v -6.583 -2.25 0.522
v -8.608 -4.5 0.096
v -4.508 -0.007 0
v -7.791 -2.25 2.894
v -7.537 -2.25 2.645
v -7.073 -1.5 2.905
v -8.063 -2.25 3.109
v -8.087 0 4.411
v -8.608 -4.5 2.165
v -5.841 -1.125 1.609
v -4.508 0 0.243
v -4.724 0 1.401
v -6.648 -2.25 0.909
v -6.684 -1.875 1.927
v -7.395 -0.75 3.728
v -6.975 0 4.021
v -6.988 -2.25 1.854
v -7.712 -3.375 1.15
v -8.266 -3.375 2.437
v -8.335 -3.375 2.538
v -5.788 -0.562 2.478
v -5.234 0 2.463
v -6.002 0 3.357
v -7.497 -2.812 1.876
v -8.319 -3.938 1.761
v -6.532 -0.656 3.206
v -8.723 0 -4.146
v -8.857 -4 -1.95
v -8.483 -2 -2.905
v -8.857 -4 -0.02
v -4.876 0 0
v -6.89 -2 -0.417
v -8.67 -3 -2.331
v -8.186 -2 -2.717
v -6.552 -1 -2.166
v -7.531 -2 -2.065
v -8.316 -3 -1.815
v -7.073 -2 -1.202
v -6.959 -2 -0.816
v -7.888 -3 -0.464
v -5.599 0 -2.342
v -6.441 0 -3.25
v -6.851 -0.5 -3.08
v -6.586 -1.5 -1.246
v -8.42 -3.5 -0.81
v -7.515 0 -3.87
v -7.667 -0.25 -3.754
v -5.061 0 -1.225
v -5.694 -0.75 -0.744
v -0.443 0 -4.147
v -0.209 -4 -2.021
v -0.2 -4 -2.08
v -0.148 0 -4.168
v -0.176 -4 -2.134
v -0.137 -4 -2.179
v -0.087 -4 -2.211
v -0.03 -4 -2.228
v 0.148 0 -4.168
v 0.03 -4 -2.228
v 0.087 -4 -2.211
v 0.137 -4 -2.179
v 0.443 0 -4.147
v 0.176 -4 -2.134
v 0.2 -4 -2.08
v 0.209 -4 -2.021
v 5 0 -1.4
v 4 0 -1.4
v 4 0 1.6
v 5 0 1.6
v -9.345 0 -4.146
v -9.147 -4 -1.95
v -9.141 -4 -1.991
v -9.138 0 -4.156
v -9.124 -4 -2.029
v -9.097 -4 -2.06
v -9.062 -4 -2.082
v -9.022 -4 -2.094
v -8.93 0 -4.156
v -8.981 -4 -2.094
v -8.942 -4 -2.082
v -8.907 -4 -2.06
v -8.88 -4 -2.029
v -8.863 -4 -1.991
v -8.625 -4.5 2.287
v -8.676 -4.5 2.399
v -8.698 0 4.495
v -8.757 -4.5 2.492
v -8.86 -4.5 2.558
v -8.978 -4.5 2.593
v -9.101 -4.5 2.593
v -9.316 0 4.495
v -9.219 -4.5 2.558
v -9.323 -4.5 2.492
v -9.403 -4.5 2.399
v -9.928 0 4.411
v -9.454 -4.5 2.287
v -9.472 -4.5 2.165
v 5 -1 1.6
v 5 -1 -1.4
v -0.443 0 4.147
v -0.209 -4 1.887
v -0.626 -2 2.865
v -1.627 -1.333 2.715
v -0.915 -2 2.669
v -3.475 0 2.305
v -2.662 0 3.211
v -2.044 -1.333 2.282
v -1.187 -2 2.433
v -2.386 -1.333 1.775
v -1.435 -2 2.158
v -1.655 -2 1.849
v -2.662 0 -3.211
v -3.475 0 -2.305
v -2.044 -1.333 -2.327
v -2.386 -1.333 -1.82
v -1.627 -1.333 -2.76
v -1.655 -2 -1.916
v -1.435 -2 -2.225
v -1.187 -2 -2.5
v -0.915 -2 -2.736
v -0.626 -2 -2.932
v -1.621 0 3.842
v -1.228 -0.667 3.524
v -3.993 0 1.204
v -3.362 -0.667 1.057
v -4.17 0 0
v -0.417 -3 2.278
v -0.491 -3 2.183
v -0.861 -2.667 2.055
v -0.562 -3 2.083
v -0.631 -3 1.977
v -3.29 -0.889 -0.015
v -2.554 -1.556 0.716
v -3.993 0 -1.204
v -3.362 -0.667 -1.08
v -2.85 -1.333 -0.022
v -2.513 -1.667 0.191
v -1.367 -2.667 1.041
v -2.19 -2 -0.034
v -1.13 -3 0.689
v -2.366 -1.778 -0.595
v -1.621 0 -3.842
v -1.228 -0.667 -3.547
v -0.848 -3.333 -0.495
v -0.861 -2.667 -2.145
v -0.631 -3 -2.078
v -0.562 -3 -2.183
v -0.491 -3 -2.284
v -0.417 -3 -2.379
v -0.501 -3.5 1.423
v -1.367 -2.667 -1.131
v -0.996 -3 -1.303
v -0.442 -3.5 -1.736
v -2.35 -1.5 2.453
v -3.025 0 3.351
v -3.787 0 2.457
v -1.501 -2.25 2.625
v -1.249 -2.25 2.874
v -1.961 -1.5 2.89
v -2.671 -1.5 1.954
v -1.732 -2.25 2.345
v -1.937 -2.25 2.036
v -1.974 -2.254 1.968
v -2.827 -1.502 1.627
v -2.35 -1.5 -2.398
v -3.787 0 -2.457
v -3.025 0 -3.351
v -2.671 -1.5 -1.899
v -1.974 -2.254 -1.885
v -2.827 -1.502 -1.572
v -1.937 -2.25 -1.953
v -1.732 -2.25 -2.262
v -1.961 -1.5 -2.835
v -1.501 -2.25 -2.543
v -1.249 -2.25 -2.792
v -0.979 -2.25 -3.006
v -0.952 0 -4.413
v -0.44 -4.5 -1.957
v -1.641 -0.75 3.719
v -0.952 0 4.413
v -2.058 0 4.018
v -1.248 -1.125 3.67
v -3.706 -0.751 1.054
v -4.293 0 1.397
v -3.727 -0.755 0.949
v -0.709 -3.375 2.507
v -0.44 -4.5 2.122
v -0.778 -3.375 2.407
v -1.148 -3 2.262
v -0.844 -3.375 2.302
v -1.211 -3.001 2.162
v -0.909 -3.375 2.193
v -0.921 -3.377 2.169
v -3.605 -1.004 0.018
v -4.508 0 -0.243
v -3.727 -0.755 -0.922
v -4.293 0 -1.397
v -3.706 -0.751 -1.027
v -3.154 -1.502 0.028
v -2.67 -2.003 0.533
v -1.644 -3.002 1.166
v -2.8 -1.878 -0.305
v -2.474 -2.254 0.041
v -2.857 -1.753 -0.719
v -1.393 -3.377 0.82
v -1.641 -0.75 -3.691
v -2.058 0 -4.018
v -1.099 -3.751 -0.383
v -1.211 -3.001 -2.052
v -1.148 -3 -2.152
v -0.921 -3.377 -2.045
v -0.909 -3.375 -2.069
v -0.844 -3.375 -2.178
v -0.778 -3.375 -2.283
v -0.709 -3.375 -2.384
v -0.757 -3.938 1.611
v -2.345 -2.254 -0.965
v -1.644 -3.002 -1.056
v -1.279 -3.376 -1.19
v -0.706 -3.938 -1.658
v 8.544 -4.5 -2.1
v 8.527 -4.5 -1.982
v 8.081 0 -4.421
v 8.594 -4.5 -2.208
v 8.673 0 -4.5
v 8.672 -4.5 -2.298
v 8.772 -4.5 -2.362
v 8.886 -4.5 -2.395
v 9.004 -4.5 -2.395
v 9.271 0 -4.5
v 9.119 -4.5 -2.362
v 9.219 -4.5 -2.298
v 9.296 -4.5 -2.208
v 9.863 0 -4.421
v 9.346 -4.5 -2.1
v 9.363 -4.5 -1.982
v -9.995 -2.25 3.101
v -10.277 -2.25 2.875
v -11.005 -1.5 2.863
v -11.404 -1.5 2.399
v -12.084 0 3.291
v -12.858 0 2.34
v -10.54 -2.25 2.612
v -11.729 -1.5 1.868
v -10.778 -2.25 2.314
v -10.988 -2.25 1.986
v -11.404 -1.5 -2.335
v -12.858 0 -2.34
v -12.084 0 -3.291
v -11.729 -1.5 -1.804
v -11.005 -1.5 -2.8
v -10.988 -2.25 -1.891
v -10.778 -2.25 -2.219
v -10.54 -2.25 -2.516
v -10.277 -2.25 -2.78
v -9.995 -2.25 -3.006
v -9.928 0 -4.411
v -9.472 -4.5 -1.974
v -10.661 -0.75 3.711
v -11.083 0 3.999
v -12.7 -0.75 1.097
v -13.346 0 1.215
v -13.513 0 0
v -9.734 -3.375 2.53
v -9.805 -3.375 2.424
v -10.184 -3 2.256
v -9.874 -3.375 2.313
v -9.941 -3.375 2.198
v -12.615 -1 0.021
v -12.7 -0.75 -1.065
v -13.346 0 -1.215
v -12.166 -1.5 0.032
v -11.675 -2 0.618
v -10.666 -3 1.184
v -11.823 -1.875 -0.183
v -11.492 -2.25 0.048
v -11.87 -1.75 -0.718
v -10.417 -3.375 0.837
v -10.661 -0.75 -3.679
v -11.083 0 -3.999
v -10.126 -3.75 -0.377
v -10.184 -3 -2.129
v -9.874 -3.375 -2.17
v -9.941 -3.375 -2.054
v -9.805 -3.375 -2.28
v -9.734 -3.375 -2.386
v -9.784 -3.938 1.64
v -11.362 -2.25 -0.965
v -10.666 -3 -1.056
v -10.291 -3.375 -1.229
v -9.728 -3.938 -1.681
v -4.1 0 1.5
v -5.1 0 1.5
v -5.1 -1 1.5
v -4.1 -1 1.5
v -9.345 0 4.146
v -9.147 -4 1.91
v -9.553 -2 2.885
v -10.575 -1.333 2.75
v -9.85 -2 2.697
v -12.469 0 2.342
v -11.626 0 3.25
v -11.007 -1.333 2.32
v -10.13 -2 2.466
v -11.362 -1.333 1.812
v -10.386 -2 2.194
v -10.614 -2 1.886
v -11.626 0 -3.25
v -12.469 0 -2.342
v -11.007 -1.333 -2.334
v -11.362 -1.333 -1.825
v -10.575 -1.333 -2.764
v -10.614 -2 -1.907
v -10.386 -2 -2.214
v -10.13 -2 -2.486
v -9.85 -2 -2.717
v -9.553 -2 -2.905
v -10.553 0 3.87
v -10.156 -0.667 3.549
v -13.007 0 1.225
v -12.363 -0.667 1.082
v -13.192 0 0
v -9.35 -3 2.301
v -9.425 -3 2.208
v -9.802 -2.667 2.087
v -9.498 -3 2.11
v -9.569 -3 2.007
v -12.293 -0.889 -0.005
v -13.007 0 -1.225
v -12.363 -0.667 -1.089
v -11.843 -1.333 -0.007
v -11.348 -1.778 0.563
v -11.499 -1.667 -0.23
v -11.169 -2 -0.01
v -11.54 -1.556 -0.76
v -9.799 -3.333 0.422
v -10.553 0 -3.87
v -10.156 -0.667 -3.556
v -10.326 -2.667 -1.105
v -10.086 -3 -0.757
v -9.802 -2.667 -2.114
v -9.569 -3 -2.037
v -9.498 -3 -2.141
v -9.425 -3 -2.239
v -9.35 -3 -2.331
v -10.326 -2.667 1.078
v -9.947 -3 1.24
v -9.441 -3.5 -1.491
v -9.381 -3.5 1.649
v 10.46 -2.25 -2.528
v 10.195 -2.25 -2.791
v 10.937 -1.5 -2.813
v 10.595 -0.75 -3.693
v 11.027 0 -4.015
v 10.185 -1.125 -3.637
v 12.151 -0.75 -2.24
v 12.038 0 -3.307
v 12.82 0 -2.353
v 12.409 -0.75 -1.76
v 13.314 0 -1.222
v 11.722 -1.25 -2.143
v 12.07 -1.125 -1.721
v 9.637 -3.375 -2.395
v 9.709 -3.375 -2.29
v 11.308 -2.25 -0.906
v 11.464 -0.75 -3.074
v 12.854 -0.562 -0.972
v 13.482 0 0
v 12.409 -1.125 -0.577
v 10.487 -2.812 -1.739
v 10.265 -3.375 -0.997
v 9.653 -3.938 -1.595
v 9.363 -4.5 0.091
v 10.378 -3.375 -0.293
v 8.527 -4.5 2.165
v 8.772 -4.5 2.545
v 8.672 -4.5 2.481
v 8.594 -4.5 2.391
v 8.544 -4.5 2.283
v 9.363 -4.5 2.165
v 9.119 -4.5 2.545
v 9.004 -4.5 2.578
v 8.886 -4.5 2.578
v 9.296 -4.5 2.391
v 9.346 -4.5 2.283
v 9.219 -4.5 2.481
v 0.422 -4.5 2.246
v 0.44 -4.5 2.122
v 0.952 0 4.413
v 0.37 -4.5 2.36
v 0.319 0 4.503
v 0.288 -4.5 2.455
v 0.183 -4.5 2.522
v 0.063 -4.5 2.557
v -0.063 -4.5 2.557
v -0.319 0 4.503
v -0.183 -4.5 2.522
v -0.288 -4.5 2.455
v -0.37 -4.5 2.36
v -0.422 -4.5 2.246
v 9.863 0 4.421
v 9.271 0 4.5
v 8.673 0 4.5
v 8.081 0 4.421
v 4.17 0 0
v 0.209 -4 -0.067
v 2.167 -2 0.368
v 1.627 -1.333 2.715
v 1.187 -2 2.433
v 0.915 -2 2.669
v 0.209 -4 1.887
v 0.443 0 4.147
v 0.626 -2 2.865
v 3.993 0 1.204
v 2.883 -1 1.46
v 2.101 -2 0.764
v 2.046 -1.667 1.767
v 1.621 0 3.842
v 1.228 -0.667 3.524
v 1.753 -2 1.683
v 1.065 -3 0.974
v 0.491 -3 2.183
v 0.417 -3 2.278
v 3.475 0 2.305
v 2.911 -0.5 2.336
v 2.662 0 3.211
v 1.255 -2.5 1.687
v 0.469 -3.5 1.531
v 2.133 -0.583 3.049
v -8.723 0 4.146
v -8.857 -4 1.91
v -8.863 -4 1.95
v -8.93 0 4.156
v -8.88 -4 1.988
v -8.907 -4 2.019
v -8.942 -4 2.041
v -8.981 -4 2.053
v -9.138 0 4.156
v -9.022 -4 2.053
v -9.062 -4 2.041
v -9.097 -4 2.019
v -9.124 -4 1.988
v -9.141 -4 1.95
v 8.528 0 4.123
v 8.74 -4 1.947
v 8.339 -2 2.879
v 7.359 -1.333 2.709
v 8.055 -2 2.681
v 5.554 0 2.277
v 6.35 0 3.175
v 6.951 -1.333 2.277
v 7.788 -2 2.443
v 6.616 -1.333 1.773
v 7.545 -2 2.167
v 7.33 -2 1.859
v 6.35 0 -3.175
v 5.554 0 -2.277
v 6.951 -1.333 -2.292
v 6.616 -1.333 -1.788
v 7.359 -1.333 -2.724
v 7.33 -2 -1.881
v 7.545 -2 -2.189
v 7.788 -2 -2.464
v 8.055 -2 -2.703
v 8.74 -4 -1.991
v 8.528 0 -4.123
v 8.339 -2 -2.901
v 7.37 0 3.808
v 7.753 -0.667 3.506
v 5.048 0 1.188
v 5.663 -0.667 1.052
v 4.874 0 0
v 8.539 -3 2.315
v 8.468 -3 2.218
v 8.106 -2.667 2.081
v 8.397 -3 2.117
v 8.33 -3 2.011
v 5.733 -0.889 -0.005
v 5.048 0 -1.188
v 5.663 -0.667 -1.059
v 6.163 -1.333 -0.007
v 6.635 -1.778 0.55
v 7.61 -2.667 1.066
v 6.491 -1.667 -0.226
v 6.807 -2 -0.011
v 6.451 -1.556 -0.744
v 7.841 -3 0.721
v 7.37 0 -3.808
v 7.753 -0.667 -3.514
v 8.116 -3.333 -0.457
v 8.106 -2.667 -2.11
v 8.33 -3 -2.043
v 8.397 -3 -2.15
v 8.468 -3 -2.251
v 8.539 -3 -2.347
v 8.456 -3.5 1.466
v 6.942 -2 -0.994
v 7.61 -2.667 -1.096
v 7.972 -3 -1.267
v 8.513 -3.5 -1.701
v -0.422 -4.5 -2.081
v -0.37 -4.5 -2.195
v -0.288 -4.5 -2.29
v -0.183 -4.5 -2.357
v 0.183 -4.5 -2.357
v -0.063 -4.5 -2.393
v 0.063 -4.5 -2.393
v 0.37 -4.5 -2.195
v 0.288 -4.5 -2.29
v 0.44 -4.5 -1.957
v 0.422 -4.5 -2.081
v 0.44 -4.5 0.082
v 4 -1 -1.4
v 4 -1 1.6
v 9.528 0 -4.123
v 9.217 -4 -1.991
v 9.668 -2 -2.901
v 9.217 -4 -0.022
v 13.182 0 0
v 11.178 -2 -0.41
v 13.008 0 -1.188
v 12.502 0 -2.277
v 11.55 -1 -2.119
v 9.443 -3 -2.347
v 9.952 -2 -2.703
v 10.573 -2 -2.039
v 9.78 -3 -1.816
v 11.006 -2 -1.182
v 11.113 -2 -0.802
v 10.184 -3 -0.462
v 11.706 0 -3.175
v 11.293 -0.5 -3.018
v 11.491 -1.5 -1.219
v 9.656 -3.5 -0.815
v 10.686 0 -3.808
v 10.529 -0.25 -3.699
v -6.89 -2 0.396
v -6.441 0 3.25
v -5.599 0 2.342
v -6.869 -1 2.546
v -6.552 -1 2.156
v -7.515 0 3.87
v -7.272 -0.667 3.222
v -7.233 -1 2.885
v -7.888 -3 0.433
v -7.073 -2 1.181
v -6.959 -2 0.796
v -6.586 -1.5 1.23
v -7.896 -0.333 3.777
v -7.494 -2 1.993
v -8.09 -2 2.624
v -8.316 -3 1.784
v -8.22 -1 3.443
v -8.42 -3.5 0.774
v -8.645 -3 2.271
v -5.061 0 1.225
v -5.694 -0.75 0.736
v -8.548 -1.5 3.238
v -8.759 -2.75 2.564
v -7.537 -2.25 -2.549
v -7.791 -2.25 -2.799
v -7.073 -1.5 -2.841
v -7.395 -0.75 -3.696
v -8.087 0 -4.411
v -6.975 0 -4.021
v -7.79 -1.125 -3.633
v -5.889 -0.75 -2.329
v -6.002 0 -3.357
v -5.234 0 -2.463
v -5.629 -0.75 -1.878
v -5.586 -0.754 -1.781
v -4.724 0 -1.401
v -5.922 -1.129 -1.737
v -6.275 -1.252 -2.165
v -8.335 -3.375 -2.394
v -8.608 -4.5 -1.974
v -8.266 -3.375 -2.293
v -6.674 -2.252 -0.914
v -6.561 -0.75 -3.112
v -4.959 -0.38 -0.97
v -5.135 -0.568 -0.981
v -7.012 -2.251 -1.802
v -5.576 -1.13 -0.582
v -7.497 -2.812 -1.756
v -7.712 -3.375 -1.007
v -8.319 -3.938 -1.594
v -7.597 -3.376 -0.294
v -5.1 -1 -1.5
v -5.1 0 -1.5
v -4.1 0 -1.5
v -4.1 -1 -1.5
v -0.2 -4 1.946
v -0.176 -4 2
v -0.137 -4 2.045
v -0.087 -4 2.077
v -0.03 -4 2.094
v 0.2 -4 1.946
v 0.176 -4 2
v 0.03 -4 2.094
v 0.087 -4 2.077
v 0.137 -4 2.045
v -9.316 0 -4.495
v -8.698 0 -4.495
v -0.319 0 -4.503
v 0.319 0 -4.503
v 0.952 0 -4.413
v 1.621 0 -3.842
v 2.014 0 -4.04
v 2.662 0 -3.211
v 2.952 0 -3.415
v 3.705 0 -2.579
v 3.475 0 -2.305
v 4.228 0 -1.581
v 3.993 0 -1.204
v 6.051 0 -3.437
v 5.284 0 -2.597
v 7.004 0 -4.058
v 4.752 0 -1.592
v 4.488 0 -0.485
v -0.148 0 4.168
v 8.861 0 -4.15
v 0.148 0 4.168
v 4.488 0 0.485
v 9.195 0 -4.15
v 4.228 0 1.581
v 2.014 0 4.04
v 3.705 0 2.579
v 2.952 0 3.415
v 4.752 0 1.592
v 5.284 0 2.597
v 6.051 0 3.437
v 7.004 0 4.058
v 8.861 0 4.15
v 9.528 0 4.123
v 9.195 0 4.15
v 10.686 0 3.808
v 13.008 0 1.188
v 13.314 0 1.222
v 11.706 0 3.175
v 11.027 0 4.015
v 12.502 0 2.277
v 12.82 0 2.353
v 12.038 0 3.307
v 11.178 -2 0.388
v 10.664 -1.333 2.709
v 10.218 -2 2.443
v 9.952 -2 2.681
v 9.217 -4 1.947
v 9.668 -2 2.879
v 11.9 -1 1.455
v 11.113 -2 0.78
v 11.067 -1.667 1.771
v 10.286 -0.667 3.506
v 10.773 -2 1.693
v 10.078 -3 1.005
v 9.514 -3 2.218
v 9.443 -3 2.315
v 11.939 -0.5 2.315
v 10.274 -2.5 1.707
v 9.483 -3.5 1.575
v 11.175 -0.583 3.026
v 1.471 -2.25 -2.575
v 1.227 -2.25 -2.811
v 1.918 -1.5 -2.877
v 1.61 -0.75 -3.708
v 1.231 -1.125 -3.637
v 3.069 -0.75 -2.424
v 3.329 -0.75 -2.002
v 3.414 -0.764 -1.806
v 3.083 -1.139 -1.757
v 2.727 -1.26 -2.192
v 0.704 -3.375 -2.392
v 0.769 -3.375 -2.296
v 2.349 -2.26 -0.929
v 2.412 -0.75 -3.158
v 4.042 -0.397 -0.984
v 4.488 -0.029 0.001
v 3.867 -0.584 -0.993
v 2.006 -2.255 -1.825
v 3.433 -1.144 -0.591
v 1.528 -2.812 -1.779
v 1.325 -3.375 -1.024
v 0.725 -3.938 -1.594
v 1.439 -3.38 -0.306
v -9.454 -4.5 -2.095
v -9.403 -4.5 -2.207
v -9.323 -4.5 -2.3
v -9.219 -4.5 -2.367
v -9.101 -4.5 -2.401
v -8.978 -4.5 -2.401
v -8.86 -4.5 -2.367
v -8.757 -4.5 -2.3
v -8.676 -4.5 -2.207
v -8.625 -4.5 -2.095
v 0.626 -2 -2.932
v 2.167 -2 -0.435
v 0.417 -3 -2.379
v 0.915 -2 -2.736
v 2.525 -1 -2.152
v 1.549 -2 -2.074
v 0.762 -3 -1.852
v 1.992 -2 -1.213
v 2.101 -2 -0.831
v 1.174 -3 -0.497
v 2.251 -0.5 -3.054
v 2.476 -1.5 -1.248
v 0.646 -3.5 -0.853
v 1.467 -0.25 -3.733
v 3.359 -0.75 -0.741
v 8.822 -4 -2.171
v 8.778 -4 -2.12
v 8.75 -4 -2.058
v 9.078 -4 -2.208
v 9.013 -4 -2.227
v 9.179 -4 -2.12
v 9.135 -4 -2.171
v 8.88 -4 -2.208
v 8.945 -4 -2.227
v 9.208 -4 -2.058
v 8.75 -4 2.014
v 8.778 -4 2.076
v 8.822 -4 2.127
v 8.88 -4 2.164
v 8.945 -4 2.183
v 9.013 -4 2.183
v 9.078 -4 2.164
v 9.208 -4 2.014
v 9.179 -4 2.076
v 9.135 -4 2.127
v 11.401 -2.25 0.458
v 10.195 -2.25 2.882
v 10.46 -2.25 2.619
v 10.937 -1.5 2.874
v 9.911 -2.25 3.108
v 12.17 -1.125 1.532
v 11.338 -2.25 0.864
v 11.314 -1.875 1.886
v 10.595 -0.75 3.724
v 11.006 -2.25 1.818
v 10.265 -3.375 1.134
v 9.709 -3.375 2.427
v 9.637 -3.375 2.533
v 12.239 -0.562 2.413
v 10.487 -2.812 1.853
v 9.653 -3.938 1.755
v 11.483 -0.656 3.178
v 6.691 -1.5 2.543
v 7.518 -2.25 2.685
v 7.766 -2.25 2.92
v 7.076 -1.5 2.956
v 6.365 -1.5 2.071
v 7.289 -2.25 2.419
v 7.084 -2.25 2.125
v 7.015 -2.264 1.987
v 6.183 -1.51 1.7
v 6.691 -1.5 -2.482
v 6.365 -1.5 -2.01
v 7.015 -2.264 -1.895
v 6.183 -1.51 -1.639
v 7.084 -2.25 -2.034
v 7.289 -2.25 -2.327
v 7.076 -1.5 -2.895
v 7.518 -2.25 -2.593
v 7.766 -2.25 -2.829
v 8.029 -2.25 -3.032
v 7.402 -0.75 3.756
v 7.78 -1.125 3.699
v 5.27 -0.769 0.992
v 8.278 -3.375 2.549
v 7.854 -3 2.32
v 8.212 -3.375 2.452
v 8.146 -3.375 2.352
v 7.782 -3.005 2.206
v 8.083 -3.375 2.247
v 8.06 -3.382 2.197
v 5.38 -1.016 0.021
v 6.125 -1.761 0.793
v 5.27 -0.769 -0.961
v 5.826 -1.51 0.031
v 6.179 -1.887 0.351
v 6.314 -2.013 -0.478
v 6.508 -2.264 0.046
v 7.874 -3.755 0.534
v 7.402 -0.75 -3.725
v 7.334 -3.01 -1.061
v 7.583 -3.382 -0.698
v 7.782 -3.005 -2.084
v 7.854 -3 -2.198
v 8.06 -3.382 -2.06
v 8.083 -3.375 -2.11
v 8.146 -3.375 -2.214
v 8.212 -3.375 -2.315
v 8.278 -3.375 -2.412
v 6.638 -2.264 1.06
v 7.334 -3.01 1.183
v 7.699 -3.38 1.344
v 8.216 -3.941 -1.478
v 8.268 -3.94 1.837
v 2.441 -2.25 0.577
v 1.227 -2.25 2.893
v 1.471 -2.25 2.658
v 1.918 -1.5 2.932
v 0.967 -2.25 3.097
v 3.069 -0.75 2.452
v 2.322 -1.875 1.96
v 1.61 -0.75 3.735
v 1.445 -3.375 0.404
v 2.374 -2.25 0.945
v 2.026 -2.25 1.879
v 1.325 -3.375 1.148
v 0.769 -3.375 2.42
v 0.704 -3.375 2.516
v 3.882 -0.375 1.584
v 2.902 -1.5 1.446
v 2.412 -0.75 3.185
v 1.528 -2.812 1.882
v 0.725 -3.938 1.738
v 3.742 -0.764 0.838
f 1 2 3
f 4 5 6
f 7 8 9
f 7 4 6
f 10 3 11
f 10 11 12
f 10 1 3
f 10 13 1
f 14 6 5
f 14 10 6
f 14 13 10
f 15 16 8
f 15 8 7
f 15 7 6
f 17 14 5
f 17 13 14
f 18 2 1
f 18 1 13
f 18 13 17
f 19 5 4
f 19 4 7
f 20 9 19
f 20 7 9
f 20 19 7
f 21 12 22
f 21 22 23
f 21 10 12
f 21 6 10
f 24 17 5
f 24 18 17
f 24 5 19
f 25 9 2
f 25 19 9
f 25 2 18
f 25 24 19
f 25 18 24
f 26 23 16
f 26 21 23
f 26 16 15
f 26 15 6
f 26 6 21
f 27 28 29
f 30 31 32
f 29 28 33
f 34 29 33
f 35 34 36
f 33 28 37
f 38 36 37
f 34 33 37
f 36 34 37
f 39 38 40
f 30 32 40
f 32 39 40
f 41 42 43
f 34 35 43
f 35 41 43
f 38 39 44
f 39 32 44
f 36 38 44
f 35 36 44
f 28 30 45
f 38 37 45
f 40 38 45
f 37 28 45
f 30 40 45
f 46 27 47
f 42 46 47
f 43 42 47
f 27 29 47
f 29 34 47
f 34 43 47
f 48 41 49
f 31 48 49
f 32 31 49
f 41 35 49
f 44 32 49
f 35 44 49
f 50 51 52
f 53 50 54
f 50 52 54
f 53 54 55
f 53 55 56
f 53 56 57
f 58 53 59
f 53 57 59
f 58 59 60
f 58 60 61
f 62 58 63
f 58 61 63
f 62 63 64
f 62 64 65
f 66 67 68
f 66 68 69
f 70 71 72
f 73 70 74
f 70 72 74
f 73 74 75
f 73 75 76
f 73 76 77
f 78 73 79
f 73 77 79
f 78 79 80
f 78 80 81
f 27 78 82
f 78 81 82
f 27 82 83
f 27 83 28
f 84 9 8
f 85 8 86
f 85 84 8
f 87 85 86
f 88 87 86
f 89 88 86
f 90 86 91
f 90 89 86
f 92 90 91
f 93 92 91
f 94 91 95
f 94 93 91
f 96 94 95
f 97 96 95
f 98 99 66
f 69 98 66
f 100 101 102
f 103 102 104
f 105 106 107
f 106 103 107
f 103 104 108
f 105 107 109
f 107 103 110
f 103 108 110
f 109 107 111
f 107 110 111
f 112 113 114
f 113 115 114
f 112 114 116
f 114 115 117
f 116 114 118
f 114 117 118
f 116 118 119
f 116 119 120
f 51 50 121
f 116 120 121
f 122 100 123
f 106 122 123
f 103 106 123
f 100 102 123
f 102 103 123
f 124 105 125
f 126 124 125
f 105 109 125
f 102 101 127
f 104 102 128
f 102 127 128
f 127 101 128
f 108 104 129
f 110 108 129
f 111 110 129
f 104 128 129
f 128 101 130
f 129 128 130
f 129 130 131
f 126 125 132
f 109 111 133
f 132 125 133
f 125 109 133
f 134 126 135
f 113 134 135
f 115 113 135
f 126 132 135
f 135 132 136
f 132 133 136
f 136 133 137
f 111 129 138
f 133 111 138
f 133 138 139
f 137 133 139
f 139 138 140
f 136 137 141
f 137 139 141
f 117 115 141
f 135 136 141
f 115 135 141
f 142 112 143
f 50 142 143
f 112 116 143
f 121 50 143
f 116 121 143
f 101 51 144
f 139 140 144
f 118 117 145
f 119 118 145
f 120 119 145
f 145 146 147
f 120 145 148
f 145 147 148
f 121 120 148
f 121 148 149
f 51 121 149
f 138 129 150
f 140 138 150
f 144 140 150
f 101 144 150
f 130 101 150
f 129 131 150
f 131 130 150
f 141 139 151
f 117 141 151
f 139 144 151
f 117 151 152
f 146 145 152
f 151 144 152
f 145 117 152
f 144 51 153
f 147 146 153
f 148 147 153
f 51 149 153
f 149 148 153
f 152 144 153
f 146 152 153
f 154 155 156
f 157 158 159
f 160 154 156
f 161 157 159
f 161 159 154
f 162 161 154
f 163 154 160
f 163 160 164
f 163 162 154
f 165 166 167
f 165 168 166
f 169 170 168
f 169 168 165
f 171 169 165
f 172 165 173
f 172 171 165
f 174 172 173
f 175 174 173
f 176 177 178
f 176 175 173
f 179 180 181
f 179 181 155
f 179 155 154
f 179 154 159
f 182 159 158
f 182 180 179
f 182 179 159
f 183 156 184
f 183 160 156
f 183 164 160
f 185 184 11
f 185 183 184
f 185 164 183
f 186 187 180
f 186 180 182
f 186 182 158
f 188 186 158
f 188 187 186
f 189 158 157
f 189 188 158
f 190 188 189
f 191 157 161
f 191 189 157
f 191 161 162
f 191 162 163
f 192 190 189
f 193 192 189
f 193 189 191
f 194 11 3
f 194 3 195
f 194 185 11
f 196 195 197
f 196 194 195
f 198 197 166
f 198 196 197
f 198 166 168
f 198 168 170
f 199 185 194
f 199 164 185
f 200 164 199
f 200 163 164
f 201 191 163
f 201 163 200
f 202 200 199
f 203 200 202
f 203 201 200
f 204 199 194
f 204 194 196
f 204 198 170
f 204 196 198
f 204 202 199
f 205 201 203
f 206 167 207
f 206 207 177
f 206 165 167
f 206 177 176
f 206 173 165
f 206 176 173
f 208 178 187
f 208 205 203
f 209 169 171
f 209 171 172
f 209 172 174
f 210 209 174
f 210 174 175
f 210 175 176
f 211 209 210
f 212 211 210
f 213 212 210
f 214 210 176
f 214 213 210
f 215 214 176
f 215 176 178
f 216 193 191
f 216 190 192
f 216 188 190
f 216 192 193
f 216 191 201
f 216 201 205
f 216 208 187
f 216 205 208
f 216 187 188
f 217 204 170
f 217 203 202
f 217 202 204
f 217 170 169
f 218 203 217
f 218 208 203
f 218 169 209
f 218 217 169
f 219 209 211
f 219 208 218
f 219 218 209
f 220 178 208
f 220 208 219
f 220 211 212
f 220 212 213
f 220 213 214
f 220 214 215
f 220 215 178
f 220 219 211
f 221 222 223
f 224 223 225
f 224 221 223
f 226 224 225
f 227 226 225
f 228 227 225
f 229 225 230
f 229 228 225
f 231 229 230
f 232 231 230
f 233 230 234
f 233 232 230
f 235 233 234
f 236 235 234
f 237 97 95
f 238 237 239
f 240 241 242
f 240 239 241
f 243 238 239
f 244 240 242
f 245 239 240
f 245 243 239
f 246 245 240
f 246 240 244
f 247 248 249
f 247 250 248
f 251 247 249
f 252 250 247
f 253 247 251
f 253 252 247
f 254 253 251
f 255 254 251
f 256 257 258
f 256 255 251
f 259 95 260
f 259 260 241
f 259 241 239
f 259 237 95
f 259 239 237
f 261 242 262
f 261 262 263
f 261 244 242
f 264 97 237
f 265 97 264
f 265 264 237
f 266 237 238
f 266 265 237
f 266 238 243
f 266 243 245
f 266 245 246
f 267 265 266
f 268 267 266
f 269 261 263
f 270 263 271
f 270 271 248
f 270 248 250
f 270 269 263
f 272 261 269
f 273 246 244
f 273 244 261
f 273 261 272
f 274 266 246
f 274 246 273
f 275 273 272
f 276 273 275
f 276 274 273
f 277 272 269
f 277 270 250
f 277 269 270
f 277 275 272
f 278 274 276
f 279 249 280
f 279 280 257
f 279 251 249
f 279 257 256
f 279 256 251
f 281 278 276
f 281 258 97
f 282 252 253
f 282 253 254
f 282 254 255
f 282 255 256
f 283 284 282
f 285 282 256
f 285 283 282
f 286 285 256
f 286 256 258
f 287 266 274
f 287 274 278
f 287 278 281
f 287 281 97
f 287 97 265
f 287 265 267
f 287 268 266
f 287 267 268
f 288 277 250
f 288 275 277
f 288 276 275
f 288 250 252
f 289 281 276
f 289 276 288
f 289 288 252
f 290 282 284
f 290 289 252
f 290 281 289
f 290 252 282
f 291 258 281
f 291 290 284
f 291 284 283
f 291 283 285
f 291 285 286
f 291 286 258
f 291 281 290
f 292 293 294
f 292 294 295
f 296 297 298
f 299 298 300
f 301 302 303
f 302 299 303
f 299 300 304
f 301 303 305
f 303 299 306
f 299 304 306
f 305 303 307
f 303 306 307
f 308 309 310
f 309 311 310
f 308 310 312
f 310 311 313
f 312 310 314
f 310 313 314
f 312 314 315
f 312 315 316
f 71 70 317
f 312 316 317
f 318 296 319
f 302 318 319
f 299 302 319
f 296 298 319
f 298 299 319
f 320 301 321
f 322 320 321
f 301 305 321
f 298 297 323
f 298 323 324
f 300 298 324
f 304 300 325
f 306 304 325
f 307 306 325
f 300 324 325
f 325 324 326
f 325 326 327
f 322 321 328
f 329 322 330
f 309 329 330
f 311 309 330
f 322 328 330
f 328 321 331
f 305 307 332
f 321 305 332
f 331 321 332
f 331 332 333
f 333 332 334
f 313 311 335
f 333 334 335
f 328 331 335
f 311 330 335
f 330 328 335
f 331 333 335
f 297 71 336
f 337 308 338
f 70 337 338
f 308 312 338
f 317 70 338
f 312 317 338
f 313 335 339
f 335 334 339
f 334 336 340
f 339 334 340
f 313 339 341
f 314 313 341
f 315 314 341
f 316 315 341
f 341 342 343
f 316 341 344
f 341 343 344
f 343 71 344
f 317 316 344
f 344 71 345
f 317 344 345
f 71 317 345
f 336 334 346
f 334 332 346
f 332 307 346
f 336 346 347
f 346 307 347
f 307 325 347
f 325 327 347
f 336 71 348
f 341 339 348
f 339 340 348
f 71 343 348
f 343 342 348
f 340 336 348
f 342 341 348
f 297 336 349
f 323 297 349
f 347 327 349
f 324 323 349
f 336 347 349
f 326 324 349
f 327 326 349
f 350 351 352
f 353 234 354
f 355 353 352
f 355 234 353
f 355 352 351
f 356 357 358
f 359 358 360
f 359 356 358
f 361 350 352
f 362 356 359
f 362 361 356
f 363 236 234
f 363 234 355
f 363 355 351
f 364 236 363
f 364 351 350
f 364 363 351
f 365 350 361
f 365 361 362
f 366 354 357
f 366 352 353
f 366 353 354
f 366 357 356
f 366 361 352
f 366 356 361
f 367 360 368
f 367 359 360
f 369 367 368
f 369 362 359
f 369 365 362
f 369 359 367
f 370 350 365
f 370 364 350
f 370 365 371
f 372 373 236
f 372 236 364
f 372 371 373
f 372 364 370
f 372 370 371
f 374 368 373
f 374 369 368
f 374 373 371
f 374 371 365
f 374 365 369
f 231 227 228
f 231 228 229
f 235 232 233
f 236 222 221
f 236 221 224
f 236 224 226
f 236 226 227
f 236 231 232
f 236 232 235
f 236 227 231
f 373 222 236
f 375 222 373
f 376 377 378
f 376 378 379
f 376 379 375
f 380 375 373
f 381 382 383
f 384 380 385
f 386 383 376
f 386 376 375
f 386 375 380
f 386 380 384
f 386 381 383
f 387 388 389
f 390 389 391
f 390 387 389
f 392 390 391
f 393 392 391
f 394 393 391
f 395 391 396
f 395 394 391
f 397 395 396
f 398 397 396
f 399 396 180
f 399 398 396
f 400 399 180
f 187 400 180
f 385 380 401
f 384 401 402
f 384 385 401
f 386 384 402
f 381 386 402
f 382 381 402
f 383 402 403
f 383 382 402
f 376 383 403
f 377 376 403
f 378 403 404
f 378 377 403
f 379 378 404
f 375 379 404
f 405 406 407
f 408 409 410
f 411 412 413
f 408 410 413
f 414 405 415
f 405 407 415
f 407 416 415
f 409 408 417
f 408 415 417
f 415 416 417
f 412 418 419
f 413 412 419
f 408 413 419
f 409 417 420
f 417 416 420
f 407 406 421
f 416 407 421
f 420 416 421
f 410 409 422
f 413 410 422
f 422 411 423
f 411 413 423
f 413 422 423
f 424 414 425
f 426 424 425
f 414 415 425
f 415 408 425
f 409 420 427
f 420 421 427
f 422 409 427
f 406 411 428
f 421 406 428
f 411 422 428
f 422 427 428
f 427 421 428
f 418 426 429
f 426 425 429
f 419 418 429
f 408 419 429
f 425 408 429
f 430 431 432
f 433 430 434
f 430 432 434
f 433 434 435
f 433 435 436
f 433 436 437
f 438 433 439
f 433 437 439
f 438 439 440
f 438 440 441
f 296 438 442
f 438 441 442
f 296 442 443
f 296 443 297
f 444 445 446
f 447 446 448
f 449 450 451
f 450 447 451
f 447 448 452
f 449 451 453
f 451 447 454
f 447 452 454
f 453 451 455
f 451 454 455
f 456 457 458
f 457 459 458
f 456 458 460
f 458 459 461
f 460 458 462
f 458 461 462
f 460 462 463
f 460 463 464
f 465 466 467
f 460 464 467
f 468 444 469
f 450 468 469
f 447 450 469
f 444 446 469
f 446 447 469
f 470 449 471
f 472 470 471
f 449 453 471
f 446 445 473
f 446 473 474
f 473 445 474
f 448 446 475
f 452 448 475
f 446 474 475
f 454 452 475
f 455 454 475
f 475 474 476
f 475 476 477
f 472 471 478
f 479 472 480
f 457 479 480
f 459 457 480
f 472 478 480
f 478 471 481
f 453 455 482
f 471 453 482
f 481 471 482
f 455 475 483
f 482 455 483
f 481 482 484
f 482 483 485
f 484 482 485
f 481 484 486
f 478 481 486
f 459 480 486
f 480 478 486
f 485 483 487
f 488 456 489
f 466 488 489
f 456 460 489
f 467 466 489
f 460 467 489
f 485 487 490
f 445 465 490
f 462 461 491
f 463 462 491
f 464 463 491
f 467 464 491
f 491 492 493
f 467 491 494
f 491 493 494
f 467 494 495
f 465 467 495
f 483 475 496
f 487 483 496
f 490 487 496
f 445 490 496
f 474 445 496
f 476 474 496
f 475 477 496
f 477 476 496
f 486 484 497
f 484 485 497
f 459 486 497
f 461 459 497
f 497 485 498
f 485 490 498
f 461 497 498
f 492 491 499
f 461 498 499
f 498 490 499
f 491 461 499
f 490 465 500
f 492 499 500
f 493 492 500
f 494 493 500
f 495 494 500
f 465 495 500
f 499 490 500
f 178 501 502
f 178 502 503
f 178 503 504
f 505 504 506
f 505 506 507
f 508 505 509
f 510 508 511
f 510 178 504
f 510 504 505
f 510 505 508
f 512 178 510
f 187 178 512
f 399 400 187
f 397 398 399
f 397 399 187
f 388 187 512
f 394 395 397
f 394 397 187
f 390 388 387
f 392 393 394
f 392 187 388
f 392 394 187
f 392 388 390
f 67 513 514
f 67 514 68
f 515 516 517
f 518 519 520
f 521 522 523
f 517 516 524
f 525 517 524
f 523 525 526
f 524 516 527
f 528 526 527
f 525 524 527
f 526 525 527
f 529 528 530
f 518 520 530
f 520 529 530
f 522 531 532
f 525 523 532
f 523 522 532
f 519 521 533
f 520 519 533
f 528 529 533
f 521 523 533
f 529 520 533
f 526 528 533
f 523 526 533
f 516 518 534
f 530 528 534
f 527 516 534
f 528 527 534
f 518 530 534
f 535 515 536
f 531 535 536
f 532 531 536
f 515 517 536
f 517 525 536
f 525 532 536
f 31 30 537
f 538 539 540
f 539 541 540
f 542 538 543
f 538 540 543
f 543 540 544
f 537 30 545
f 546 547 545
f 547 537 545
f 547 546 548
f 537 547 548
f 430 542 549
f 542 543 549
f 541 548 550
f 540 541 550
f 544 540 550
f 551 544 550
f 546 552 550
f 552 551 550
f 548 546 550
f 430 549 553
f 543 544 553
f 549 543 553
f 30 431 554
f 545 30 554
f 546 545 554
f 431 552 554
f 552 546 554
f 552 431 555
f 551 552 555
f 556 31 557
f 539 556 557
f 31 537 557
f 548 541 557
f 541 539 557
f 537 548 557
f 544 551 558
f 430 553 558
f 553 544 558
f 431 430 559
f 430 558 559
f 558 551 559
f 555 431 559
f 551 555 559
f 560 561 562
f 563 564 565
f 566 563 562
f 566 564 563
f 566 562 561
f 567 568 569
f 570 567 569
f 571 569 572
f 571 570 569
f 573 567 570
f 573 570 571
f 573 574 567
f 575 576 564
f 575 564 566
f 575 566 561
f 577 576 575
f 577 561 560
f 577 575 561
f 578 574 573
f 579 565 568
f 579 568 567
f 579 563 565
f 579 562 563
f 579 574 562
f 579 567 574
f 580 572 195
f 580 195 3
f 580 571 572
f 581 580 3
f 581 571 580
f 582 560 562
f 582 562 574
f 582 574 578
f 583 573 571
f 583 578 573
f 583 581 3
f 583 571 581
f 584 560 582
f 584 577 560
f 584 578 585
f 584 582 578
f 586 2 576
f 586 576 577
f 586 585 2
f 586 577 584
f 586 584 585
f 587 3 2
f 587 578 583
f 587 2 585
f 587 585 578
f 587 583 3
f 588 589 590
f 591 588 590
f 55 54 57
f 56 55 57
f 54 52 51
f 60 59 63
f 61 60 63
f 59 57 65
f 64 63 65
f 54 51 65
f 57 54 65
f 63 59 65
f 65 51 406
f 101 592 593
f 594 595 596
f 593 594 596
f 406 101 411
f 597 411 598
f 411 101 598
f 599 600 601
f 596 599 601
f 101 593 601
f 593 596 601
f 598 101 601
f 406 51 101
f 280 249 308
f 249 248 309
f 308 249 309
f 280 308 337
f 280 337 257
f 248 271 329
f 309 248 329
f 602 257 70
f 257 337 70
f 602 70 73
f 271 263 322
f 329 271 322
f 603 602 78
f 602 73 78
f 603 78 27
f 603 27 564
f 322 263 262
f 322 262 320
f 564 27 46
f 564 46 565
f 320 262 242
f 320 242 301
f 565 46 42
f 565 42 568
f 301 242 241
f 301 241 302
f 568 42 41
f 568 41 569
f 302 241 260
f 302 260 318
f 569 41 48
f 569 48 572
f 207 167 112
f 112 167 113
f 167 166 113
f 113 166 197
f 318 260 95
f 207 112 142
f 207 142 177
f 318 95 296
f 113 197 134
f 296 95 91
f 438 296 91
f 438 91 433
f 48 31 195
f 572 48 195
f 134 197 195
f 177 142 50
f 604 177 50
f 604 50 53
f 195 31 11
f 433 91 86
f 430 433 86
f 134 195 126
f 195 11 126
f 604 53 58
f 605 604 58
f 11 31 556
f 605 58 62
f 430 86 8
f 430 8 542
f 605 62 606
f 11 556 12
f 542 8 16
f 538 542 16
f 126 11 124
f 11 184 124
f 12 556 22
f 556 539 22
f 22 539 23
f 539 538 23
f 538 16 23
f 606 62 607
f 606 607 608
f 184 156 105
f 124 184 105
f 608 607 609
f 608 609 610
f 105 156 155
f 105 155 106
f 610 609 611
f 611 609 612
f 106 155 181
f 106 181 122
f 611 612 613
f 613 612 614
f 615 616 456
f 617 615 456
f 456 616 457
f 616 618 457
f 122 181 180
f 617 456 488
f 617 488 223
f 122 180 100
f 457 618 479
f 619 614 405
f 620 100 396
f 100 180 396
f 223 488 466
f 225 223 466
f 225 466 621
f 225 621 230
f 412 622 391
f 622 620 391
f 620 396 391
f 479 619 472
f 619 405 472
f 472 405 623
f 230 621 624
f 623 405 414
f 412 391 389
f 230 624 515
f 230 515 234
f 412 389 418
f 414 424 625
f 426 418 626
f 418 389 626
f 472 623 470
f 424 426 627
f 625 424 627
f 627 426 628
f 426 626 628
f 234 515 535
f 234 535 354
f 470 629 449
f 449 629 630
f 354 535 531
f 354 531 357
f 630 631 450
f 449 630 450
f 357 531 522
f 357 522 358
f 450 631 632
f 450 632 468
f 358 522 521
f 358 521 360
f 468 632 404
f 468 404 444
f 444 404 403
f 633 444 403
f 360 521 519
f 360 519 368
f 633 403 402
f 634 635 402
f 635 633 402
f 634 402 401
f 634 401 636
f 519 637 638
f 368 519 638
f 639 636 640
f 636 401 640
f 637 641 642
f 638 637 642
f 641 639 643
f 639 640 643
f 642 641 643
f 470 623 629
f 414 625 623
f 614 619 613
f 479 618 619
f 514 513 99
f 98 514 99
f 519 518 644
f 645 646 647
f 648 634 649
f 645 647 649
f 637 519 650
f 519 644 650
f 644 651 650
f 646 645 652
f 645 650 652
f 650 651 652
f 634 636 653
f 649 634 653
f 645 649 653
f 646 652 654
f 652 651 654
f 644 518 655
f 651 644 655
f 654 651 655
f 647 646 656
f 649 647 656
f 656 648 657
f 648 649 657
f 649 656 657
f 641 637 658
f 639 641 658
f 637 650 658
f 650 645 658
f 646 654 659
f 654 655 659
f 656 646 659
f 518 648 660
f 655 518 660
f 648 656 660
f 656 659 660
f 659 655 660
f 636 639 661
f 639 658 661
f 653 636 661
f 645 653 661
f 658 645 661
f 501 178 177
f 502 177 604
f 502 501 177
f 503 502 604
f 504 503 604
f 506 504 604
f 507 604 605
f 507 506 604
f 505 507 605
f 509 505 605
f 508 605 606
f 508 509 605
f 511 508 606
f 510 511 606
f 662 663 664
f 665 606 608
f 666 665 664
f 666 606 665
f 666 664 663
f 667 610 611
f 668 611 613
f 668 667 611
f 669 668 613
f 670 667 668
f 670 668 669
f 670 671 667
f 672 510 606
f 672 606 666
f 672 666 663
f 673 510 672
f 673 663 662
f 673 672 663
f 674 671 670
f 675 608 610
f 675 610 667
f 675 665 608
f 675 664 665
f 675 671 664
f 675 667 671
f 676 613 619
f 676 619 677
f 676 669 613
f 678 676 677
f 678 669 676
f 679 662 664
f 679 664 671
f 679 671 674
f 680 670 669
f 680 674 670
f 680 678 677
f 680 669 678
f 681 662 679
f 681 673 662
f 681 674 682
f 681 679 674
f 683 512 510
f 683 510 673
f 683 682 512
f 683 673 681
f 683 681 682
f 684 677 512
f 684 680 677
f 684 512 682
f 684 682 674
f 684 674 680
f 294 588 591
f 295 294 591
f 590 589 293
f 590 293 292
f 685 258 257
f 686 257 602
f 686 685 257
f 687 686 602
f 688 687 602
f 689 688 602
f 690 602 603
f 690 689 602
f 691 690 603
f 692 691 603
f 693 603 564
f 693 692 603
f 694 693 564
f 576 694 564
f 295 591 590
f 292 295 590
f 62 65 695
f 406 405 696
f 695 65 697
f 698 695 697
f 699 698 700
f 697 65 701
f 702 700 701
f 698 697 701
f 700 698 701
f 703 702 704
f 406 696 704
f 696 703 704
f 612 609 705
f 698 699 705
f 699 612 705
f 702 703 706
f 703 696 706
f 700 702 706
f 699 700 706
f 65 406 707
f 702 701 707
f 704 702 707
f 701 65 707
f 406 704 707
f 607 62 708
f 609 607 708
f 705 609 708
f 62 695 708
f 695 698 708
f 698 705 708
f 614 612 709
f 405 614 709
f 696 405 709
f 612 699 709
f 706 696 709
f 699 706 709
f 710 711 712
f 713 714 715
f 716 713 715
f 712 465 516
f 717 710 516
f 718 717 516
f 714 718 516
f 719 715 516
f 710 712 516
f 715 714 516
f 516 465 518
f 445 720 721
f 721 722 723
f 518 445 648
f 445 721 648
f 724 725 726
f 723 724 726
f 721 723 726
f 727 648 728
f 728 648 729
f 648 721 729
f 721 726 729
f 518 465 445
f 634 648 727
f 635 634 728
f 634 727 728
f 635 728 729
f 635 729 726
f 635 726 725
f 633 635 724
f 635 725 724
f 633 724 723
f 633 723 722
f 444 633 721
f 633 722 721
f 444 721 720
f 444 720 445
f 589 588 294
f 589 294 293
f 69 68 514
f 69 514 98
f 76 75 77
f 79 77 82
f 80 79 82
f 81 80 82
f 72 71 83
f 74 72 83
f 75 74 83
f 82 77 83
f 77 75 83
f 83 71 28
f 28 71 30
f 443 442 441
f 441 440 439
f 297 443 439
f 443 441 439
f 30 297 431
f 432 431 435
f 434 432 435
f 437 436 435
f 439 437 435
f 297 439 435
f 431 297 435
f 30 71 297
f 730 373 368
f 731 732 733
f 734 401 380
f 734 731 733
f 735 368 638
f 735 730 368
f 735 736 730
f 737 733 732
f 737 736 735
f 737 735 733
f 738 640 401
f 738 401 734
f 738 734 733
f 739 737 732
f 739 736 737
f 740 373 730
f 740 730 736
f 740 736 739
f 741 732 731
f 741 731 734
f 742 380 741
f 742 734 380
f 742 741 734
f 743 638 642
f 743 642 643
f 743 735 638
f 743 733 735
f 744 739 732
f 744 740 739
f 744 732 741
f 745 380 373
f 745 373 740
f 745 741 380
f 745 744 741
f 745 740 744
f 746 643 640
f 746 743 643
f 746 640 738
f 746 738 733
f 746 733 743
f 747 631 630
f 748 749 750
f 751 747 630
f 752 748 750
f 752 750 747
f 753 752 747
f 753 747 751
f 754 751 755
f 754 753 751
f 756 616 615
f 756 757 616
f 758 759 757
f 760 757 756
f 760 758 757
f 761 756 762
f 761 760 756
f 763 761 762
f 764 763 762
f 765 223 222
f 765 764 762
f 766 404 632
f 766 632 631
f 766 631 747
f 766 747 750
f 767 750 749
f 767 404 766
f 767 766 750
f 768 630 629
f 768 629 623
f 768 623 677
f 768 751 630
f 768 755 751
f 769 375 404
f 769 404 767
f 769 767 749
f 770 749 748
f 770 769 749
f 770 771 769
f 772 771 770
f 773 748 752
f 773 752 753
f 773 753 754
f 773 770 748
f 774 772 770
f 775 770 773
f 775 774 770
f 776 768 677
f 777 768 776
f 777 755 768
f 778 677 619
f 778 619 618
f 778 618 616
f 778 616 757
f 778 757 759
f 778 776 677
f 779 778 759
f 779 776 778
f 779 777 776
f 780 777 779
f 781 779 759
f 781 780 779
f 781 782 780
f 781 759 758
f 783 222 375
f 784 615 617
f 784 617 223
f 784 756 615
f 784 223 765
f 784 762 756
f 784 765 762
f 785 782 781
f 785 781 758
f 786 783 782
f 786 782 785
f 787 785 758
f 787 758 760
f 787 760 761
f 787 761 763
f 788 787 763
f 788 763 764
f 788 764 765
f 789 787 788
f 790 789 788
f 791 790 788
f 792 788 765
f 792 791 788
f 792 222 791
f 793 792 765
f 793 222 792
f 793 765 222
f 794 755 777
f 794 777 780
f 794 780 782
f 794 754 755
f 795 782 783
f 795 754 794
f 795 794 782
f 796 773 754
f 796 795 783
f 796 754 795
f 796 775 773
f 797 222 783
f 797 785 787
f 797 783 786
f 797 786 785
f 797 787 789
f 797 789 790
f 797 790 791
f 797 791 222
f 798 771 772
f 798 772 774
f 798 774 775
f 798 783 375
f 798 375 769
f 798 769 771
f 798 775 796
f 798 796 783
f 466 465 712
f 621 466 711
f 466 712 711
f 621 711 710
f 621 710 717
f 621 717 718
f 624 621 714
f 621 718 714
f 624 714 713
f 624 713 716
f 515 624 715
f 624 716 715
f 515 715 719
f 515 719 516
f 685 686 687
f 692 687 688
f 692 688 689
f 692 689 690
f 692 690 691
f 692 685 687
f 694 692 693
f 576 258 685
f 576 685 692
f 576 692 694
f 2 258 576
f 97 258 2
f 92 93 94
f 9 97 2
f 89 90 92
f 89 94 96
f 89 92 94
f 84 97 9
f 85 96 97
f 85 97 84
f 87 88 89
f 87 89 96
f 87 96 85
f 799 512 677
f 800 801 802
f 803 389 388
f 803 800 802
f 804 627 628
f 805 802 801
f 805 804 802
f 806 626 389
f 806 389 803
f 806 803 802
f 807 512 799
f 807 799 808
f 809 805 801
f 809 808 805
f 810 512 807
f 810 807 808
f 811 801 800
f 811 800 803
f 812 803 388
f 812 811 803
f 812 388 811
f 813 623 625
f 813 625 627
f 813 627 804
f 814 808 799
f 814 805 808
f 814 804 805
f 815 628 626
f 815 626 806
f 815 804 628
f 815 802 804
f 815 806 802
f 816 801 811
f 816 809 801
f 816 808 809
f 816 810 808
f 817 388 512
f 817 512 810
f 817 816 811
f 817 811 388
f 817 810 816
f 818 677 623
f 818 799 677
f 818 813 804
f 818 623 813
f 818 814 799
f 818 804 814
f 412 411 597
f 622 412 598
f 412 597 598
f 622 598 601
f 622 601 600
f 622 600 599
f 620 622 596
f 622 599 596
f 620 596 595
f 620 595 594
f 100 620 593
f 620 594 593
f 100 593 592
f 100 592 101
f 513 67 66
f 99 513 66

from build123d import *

# Parameters (mm, degrees)
SKETCH001_R  = 4.505883
SKETCH002_R  = 4.157663
SKETCH005_R  = 4.514229
SKETCH007_R  = 4.170362
SKETCH009_R  = 4.510212
SKETCH011_R  = 4.153649
BOX_W        = 1
BOX_H        = 1
BOX_DEPTH    = 3
BOX001_W     = 1
BOX001_H     = 1
BOX001_DEPTH = 3


with BuildPart() as body:
    # Sketch001 → AdditiveLoft section 0
    with BuildSketch(Plane.XZ):
        with Locations((-9.007039, 0)):
            Circle(SKETCH001_R)
    # Sketch003 (on DatumPlane) → AdditiveLoft section 1
    with BuildSketch(Plane.XZ.offset(4.5)):
        with BuildLine():
            ThreePointArc((-9.471652, -1.97382), (-9.039764, -2.405708), (-8.607876, -1.97382))
            Line((-8.607876, -1.97382), (-8.607876, 2.165107))
            ThreePointArc((-8.607876, 2.165107), (-9.039764, 2.596995), (-9.471652, 2.165107))
            Line((-9.471652, -1.97382), (-9.471652, 2.165107))
        make_face()
    loft()

    # Sketch002 → SubtractiveLoft section 0
    with BuildSketch(Plane.XZ):
        with Locations((-9.03385, 0)):
            Circle(SKETCH002_R)
    # Sketch004 (on DatumPlane) → SubtractiveLoft section 1
    with BuildSketch(Plane.XZ.offset(4)):
        with BuildLine():
            ThreePointArc((-9.146642, -1.950446), (-9.00189, -2.095198), (-8.857138, -1.950446))
            Line((-8.857138, -1.950446), (-8.857138, 1.909597))
            ThreePointArc((-8.857138, 1.909597), (-9.00189, 2.054349), (-9.146642, 1.909597))
            Line((-9.146642, -1.950446), (-9.146642, 1.909597))
        make_face()
    loft(mode=Mode.SUBTRACT)

    # Sketch005 → AdditiveLoft001 section 0
    with BuildSketch(Plane.XZ):
        Circle(SKETCH005_R)
    # Sketch006 (on DatumPlane) → AdditiveLoft001 section 1
    with BuildSketch(Plane.XZ.offset(4.5)):
        with BuildLine():
            ThreePointArc((-0.439914, -1.957138), (0, -2.397052), (0.439914, -1.957138))
            Line((0.439914, -1.957138), (0.439914, 2.122063))
            ThreePointArc((0.439914, 2.122063), (0, 2.561977), (-0.439914, 2.122063))
            Line((-0.439914, -1.957138), (-0.439914, 2.122063))
        make_face()
    loft()

    # Sketch007 → SubtractiveLoft001 section 0
    with BuildSketch(Plane.XZ):
        Circle(SKETCH007_R)
    # Sketch008 (on DatumPlane) → SubtractiveLoft001 section 1
    with BuildSketch(Plane.XZ.offset(4)):
        with BuildLine():
            ThreePointArc((-0.208831, -2.021076), (0, -2.229907), (0.208831, -2.021076))
            Line((0.208831, -2.021076), (0.208831, 1.887047))
            ThreePointArc((0.208831, 1.887047), (0, 2.095878), (-0.208831, 1.887047))
            Line((-0.208831, -2.021076), (-0.208831, 1.887047))
        make_face()
    loft(mode=Mode.SUBTRACT)

    # Sketch009 → AdditiveLoft002 section 0
    with BuildSketch(Plane.XZ):
        with Locations((8.972085, 0)):
            Circle(SKETCH009_R)
    # Sketch010 (on DatumPlane) → AdditiveLoft002 section 1
    with BuildSketch(Plane.XZ.offset(4.5)):
        with BuildLine():
            ThreePointArc((8.527374, -1.981901), (8.945036, -2.399563), (9.362698, -1.981901))
            Line((9.362698, -1.981901), (9.362698, 2.164886))
            ThreePointArc((9.362698, 2.164886), (8.945036, 2.582548), (8.527374, 2.164886))
            Line((8.527374, -1.981901), (8.527374, 2.164886))
        make_face()
    loft()

    # Sketch011 → SubtractiveLoft002 section 0
    with BuildSketch(Plane.XZ):
        with Locations((9.027996, 0)):
            Circle(SKETCH011_R)
    # Sketch012 (on DatumPlane) → SubtractiveLoft002 section 1
    with BuildSketch(Plane.XZ.offset(4)):
        with BuildLine():
            ThreePointArc((8.740006, -1.990848), (8.97867, -2.229512), (9.217334, -1.990848))
            Line((9.217334, -1.990848), (9.217334, 1.947109))
            ThreePointArc((9.217334, 1.947109), (8.97867, 2.185773), (8.740006, 1.947109))
            Line((8.740006, -1.990848), (8.740006, 1.947109))
        make_face()
    loft(mode=Mode.SUBTRACT)


with BuildPart() as cube:
    # Box → Box (new body)
    with BuildSketch(Plane(origin=(-5.1, -1, -1.5), x_dir=(1, 0, 0), z_dir=(0, 0, 1))):
        with Locations((0.5, 0.5)):
            Rectangle(BOX_W, BOX_H)
    extrude(amount=BOX_DEPTH)


with BuildPart() as cube001:
    # Box001 → Box001 (new body)
    with BuildSketch(Plane(origin=(4, -1, -1.4), x_dir=(1, 0, 0), z_dir=(0, 0, 1))):
        with Locations((0.5, 0.5)):
            Rectangle(BOX001_W, BOX001_H)
    extrude(amount=BOX001_DEPTH)


solid = Compound([body.part, cube.part, cube001.part])
